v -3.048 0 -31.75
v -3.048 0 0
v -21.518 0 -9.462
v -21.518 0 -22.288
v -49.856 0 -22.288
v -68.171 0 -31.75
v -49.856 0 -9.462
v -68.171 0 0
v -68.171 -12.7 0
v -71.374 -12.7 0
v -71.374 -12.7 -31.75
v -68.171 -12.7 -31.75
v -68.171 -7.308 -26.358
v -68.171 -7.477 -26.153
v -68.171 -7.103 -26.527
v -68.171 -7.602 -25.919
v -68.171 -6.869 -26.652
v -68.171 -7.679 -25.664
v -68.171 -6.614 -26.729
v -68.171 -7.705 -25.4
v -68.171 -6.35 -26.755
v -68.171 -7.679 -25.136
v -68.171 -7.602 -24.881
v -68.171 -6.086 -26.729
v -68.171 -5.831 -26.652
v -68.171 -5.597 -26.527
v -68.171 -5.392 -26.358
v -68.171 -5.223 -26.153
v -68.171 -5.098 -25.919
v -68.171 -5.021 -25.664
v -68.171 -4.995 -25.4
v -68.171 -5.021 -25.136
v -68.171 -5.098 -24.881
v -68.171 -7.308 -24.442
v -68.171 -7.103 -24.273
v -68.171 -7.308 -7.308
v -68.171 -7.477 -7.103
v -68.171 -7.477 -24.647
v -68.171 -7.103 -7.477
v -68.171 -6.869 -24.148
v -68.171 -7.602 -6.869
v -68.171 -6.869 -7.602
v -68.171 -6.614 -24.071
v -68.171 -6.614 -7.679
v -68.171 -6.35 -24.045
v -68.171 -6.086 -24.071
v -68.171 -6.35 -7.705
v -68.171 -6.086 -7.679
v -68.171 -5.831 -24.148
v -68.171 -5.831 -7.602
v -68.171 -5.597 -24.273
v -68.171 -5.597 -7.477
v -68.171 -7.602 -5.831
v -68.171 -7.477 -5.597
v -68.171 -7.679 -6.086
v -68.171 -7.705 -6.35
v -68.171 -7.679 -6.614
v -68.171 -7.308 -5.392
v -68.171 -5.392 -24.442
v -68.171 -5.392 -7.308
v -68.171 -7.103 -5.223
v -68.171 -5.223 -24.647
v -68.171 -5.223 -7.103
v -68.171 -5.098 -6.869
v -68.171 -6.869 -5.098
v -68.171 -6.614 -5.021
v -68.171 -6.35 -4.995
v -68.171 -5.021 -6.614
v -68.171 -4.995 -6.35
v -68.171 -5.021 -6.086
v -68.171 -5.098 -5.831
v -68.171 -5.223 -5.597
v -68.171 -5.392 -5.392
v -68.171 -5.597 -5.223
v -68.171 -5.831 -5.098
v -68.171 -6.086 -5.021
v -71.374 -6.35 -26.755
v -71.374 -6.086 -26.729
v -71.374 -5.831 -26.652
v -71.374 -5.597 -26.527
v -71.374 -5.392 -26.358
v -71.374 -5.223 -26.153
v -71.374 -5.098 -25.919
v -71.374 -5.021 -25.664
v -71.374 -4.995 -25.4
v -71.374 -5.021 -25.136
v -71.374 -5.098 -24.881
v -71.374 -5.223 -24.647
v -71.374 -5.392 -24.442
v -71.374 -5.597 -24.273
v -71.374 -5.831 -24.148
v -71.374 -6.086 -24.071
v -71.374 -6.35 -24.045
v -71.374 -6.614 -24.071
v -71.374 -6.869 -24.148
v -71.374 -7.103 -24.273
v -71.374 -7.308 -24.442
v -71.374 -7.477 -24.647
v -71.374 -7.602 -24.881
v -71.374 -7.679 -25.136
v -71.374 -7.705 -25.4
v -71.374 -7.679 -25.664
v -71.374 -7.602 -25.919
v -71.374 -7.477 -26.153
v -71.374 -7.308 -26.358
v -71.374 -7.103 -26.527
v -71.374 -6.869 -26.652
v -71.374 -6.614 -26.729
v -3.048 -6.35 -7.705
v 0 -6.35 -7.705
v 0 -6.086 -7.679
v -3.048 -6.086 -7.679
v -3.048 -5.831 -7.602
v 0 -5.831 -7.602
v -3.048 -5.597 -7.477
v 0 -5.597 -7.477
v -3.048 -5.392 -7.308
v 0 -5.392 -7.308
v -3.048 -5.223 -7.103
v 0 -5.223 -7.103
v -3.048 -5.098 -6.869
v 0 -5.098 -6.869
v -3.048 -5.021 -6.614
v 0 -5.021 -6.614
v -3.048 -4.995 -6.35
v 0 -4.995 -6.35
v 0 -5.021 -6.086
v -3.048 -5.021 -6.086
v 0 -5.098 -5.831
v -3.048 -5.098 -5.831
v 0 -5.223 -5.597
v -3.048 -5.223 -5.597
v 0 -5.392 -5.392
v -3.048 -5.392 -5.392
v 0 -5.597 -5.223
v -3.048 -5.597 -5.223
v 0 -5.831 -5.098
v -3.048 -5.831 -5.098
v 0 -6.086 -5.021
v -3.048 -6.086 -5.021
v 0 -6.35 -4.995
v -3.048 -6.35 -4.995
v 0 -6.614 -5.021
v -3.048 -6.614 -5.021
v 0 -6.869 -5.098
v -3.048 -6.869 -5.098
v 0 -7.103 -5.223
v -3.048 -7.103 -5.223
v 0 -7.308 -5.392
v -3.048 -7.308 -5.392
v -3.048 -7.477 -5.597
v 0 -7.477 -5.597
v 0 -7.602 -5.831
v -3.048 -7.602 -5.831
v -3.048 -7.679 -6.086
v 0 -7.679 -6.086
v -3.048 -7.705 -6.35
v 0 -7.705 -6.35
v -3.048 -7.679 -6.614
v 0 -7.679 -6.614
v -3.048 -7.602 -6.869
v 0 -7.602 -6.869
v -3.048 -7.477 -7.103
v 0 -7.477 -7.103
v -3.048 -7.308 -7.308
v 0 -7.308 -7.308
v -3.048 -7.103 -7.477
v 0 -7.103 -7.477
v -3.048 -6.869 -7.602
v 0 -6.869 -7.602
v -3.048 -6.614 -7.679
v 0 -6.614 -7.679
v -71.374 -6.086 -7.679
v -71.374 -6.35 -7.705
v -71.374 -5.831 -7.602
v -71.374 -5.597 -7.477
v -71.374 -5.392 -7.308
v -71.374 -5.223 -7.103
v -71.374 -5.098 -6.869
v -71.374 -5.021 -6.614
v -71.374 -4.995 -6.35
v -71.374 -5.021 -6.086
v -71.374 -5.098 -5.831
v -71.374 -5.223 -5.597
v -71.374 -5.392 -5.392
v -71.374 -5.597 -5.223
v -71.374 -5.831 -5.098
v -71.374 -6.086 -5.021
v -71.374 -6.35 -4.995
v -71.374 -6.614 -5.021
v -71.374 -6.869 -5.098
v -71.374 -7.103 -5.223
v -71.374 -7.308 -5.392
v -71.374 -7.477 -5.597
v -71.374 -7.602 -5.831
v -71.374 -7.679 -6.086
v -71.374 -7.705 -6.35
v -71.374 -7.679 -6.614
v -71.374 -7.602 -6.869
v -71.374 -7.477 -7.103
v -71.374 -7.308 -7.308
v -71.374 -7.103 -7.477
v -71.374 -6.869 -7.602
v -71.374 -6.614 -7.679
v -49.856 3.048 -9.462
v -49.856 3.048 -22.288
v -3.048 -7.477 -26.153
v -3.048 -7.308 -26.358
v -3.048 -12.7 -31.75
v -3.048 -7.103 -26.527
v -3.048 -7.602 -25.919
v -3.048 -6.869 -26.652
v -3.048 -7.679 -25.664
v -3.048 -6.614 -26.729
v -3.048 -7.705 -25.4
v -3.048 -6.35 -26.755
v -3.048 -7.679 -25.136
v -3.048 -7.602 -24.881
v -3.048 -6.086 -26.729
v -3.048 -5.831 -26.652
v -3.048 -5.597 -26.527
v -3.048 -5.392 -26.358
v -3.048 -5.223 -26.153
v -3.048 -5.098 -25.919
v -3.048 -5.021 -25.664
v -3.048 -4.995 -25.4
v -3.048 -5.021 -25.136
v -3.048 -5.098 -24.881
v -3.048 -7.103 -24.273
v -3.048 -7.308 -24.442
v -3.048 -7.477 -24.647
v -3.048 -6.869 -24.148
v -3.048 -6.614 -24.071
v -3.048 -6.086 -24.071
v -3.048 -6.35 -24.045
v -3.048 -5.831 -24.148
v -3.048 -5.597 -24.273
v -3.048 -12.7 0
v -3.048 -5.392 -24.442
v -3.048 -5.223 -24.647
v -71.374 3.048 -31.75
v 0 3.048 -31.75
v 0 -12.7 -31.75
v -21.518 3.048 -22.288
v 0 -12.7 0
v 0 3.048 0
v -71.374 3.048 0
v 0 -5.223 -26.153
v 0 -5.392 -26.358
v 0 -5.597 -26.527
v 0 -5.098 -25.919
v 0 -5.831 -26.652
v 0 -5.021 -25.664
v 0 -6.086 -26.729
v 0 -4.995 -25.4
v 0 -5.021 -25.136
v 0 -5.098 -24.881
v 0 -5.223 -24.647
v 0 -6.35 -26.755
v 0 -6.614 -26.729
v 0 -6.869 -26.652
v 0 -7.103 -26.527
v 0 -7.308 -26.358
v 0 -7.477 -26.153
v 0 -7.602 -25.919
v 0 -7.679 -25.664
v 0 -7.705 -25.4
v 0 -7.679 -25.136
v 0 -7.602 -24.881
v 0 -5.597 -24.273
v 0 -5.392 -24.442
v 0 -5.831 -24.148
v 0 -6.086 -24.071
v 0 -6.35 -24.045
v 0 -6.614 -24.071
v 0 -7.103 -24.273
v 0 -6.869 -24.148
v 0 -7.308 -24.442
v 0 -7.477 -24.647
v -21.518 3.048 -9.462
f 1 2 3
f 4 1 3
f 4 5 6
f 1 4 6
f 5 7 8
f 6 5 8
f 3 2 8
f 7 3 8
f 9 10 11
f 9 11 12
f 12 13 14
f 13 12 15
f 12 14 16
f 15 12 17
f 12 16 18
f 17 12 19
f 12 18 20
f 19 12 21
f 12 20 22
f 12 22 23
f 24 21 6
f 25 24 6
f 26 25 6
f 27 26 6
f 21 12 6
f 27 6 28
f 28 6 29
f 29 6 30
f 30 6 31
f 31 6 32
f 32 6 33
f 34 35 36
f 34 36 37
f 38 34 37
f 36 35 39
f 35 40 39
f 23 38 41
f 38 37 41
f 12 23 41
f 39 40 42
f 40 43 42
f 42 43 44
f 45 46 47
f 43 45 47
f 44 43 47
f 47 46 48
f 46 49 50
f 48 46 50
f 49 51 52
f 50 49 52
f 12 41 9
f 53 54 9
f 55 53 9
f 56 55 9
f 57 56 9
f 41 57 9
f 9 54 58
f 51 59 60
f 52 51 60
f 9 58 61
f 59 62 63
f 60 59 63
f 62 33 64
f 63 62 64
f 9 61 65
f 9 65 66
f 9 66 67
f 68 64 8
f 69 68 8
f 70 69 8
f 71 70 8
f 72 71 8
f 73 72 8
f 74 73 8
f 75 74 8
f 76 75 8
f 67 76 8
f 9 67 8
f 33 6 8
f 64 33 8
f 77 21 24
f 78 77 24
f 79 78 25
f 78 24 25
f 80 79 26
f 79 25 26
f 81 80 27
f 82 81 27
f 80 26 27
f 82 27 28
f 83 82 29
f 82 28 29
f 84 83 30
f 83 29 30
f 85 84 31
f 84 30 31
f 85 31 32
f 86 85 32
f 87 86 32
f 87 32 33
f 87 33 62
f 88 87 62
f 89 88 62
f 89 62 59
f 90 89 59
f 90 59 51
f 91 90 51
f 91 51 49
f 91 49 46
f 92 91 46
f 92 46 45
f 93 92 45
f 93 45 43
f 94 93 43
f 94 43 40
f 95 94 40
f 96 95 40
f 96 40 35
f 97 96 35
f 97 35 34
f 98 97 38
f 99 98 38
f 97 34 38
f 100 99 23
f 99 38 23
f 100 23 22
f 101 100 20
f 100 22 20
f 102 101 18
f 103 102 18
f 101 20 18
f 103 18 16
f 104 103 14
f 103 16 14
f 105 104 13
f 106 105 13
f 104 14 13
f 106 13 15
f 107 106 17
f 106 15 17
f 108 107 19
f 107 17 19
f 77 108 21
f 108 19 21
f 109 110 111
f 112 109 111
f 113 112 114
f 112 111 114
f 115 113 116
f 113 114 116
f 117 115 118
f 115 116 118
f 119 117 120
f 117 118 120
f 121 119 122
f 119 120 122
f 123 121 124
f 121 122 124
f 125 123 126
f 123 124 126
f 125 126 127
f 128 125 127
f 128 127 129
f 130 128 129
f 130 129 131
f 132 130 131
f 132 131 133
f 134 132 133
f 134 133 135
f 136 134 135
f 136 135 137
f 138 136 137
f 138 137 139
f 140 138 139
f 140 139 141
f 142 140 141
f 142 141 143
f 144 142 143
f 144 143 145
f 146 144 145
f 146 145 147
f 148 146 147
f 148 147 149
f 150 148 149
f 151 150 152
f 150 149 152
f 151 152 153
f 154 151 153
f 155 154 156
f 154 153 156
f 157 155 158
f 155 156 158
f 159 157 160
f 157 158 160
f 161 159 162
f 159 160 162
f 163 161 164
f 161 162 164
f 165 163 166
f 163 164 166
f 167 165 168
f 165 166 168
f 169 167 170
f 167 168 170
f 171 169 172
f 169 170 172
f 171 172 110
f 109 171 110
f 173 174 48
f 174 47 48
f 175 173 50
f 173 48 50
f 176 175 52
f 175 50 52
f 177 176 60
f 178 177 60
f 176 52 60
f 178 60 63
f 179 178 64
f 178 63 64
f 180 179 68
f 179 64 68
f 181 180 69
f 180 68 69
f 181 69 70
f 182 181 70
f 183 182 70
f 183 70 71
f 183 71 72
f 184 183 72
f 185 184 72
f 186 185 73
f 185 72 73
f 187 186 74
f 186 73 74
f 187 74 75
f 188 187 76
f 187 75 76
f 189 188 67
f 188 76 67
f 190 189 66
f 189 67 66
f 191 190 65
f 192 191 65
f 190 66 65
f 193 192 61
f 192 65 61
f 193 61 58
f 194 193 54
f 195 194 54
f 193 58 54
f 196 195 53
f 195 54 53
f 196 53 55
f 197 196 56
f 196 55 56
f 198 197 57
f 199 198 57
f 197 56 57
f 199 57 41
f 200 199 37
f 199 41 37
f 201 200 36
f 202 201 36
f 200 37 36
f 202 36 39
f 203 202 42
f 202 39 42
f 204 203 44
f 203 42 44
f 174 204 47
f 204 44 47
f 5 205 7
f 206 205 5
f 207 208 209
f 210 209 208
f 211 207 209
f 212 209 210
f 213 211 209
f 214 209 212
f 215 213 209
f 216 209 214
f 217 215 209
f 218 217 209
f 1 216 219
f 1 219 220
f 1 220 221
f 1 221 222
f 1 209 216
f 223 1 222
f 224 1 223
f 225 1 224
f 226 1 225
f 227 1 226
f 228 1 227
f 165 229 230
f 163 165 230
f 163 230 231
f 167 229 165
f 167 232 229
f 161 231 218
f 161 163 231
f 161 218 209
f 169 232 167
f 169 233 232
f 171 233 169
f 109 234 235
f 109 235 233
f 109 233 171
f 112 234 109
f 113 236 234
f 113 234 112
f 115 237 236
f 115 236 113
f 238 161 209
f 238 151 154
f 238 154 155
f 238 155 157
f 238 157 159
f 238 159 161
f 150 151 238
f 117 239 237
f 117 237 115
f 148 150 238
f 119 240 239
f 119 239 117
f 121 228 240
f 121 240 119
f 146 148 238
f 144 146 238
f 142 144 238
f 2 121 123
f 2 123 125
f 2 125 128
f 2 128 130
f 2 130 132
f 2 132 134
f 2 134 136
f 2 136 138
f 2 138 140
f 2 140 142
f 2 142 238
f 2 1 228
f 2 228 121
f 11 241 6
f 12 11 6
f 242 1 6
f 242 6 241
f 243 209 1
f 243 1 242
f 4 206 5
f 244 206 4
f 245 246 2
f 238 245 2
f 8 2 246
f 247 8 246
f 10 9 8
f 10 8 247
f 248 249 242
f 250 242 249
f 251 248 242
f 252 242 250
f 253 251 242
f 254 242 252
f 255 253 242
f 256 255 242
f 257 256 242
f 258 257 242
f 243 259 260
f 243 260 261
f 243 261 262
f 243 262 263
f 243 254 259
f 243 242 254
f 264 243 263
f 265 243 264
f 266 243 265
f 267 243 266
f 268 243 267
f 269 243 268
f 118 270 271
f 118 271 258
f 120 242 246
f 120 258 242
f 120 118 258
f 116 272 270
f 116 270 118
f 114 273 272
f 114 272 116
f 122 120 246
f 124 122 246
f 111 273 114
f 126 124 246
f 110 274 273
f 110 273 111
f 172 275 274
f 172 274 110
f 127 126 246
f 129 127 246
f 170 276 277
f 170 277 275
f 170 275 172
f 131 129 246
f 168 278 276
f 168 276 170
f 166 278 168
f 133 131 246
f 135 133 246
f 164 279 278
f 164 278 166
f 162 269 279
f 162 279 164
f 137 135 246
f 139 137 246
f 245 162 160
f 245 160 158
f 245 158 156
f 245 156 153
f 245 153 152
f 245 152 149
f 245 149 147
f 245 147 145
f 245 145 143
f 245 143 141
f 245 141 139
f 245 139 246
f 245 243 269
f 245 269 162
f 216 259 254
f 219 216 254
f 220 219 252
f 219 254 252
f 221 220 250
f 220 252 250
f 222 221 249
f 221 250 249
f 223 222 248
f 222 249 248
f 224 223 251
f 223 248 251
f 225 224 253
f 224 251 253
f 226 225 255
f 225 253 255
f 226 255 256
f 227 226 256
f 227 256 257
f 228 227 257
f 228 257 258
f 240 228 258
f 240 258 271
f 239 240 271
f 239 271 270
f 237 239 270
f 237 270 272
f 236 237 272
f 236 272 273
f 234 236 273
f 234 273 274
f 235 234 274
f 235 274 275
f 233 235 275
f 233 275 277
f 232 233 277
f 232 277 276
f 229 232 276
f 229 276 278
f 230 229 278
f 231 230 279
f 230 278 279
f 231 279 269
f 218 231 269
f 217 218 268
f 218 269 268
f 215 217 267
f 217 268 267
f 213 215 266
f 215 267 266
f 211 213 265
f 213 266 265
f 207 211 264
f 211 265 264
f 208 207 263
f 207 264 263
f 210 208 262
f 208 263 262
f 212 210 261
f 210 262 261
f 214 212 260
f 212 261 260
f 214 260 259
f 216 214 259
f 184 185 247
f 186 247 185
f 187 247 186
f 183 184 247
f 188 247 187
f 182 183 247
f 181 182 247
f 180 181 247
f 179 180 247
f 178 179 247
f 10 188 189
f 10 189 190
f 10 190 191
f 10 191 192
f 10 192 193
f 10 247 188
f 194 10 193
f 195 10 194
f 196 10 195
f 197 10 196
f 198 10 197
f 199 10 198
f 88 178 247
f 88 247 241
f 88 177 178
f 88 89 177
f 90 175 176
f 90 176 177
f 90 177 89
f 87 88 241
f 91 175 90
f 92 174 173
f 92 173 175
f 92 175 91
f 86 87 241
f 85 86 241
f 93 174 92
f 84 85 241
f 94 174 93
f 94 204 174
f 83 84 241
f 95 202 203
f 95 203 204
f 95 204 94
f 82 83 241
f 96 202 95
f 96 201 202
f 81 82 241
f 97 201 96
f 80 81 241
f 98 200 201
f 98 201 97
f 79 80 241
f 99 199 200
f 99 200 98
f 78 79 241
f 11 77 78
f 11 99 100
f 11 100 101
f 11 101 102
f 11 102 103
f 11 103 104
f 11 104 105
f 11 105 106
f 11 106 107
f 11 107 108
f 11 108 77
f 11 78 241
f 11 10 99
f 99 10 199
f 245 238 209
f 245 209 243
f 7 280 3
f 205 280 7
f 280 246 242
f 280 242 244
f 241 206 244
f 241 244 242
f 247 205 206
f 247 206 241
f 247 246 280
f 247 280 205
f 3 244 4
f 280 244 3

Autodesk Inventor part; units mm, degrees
ref_plane "YZ Plane" through (0, 0, 0) normal (1, 0, 0) x (0, 1, 0)
ref_plane "XZ Plane" through (0, 0, 0) normal (0, 1, 0) x (-1, 0, 0)
ref_plane "XY Plane" through (0, 0, 0) normal (0, 0, 1) x (1, 0, 0)
sketch "Sketch1" plane through (0, 0, 0) normal (0, 1, 0) x (-1, 0, 0)
  line L0 (0, 0) -> (71.374, 0)
  line L1 (71.374, 0) -> (71.374, -19.05)
  line L2 (0, -19.05) -> (0, 0)
  line L3 (71.374, -19.05) -> (71.374, -31.75)
  line L4 (71.374, -31.75) -> (0, -31.75)
  line L5 (0, -31.75) -> (0, -19.05)
  line L6 (71.374, 0) -> (71.374, -6.35)
  line L7 (71.374, -6.35) -> (87.352, -6.35)
  line L8 (71.374, -31.75) -> (71.374, -25.4)
  line L9 (71.374, -25.4) -> (87.352, -25.4)
  line L10 (71.374, -6.35) -> (-10.213, -6.35)
  line L11 (71.374, -25.4) -> (-10.213, -25.4)
  dimension "d0" = 71.374
  dimension "d1" = 19.05
  dimension "d2" = 12.7
  dimension "d3" = 6.35
  dimension "d4" = 6.35
extrude "Extrusion1" add sketch "Sketch1" along normal blind 3.048
sketch "Sketch2" plane through (0, 3.048, 0) normal (0, 1, 0) x (1, 0, 0)
  line L0 (-71.374, 0) -> (0, 0) projected
  line L1 (0, 0) -> (0, 6.35)
  line L2 (0, 0) -> (0, 31.75) projected
  line L3 (0, 6.35) -> (-71.374, 6.35)
  line L4 (-71.374, 31.75) -> (-71.374, 0) projected
  line L5 (-71.374, 31.75) -> (-71.374, 25.4)
  line L6 (-71.374, 25.4) -> (0, 25.4)
  line L7 (0, 6.35) -> (0, 10.7315)
  line L8 (0, 10.7315) -> (-19.0957, 10.7315)
  line L9 (0, 25.4) -> (0, 21.0185)
  line L10 (0, 21.0185) -> (-20.1254, 21.0185)
  line L11 (0, 10.7315) -> (-22.7876, 10.7315)
  line L12 (-71.374, 6.35) -> (-71.374, 10.7315)
  line L13 (-71.374, 10.7315) -> (-48.5864, 10.7315)
  line L14 (-48.5864, 10.7315) -> (-48.5864, 21.0185)
  line L15 (-48.5864, 21.0185) -> (-71.374, 21.0185)
  line L16 (-22.7876, 10.7315) -> (-22.7876, 21.0185)
  line L17 (-22.7876, 21.0185) -> (-20.1254, 21.0185)
  line L18 (-22.7876, 10.7315) -> (-48.5864, 10.7315)
  line L19 (-48.5864, 21.0185) -> (-22.7876, 21.0185)
  line L20 (-21.5176, 10.7315) -> (-21.5176, 21.0185)
  line L21 (-49.8564, 10.7315) -> (-49.8564, 21.0185)
  line L22 (-22.7876, 9.4615) -> (-48.5864, 9.4615)
  line L23 (-48.5864, 22.2885) -> (-22.7876, 22.2885)
  line L24 (-48.5864, 9.4615) -> (-49.8564, 9.4615)
  line L25 (-49.8564, 9.4615) -> (-49.8564, 10.7315)
  line L26 (-49.8564, 21.0185) -> (-49.8564, 22.2885)
  line L27 (-49.8564, 22.2885) -> (-48.5864, 22.2885)
  line L28 (-22.7876, 22.2885) -> (-21.5176, 22.2885)
  line L29 (-21.5176, 22.2885) -> (-21.5176, 21.0185)
  line L30 (-21.5176, 10.7315) -> (-21.5176, 9.4615)
  line L31 (-22.7876, 9.4615) -> (-21.5176, 9.4615)
  dimension "d7" = 6.35
  dimension "d8" = 6.35
  dimension "d9" = 4.3815
  dimension "d10" = 4.3815
  dimension "d11" = 22.7876
  dimension "d12" = 4.3815
  dimension "d13" = 22.7876
  dimension "d14" = 1.27
  dimension "d15" = 1.27
  dimension "d16" = 1.27
  dimension "d17" = 1.27
extrude "Extrusion2" cut sketch "Sketch2" against normal blind 19.177 contours L21 L15 L14 L13 | L13 L18 L11 L30 L31 L22 L24 L25 | L26 L27 L23 L28 L29 L17 L19 L15 | L14 L19 L16 L18 | L11 L16 L17 L20
sketch "Sketch3" plane through (0, 0, 0) normal (0, -1, 0) x (1, 0, 0)
  line L0 (0, -31.75) -> (-71.374, -31.75) projected
  line L1 (0, -31.75) -> (-3.048, -31.75)
  line L2 (-3.048, -31.75) -> (-3.048, 0)
  line L3 (-3.048, 0) -> (0, 0)
  line L4 (0, 0) -> (0, -31.75) projected
  line L5 (0, 0) -> (0, -31.75)
  line L6 (-71.374, -31.75) -> (-68.1711, -31.75)
  line L7 (-68.1711, -31.75) -> (-68.1711, 0)
  line L8 (-71.374, 0) -> (0, 0) projected
  line L9 (-71.374, 0) -> (-68.1711, 0)
  line L10 (-71.374, 0) -> (-71.374, -31.75)
  dimension "d20" = 3.048
extrude "Extrusion3" add sketch "Sketch3" along normal blind 12.7 contours L0 L2 L3 L4 | L0 L10 L8 L7
sketch "Sketch4" plane through (0, 3.048, 0) normal (1, 0, 0) x (0, 0, -1)
  line L0 (0, -15.748) -> (0, 0) projected
  line L1 (0, 0) -> (0, -15.748)
  line L2 (0, -15.748) -> (0, -3.048)
  line L3 (0, -3.048) -> (31.75, -3.048) projected
  line L4 (0, -3.048) -> (31.75, -3.048)
  line L5 (31.75, -3.048) -> (31.75, -15.748)
  line L6 (31.75, -15.748) -> (0, -15.748)
  line L7 (0, -15.748) -> (0, -10.7569)
  line L8 (0, -10.7569) -> (31.75, -10.7569)
  line L9 (0, -3.048) -> (0, -8.0429)
  line L10 (0, -8.0429) -> (31.75, -8.0429)
  line L11 (0, -10.7569) -> (0, -9.398)
  line L12 (0, -9.398) -> (6.35, -9.398)
  circle A0 centre (6.35, -9.398) radius 1.3551
  line L13 (31.75, -9.398) -> (25.4, -9.398)
  circle A1 centre (25.4, -9.398) radius 1.3551
  dimension "d23" = 12.7
  dimension "d24" = 4.9911
  dimension "d25" = 4.9949
  dimension "d26" = 31.75
  dimension "d27" = 1.3589
  dimension "d28" = 6.35
  dimension "d29" = 6.35
extrude "Extrusion4" cut sketch "Sketch4" against normal blind 96.8375 contours A0 | A1
properties part number "Power Switch Mount"
